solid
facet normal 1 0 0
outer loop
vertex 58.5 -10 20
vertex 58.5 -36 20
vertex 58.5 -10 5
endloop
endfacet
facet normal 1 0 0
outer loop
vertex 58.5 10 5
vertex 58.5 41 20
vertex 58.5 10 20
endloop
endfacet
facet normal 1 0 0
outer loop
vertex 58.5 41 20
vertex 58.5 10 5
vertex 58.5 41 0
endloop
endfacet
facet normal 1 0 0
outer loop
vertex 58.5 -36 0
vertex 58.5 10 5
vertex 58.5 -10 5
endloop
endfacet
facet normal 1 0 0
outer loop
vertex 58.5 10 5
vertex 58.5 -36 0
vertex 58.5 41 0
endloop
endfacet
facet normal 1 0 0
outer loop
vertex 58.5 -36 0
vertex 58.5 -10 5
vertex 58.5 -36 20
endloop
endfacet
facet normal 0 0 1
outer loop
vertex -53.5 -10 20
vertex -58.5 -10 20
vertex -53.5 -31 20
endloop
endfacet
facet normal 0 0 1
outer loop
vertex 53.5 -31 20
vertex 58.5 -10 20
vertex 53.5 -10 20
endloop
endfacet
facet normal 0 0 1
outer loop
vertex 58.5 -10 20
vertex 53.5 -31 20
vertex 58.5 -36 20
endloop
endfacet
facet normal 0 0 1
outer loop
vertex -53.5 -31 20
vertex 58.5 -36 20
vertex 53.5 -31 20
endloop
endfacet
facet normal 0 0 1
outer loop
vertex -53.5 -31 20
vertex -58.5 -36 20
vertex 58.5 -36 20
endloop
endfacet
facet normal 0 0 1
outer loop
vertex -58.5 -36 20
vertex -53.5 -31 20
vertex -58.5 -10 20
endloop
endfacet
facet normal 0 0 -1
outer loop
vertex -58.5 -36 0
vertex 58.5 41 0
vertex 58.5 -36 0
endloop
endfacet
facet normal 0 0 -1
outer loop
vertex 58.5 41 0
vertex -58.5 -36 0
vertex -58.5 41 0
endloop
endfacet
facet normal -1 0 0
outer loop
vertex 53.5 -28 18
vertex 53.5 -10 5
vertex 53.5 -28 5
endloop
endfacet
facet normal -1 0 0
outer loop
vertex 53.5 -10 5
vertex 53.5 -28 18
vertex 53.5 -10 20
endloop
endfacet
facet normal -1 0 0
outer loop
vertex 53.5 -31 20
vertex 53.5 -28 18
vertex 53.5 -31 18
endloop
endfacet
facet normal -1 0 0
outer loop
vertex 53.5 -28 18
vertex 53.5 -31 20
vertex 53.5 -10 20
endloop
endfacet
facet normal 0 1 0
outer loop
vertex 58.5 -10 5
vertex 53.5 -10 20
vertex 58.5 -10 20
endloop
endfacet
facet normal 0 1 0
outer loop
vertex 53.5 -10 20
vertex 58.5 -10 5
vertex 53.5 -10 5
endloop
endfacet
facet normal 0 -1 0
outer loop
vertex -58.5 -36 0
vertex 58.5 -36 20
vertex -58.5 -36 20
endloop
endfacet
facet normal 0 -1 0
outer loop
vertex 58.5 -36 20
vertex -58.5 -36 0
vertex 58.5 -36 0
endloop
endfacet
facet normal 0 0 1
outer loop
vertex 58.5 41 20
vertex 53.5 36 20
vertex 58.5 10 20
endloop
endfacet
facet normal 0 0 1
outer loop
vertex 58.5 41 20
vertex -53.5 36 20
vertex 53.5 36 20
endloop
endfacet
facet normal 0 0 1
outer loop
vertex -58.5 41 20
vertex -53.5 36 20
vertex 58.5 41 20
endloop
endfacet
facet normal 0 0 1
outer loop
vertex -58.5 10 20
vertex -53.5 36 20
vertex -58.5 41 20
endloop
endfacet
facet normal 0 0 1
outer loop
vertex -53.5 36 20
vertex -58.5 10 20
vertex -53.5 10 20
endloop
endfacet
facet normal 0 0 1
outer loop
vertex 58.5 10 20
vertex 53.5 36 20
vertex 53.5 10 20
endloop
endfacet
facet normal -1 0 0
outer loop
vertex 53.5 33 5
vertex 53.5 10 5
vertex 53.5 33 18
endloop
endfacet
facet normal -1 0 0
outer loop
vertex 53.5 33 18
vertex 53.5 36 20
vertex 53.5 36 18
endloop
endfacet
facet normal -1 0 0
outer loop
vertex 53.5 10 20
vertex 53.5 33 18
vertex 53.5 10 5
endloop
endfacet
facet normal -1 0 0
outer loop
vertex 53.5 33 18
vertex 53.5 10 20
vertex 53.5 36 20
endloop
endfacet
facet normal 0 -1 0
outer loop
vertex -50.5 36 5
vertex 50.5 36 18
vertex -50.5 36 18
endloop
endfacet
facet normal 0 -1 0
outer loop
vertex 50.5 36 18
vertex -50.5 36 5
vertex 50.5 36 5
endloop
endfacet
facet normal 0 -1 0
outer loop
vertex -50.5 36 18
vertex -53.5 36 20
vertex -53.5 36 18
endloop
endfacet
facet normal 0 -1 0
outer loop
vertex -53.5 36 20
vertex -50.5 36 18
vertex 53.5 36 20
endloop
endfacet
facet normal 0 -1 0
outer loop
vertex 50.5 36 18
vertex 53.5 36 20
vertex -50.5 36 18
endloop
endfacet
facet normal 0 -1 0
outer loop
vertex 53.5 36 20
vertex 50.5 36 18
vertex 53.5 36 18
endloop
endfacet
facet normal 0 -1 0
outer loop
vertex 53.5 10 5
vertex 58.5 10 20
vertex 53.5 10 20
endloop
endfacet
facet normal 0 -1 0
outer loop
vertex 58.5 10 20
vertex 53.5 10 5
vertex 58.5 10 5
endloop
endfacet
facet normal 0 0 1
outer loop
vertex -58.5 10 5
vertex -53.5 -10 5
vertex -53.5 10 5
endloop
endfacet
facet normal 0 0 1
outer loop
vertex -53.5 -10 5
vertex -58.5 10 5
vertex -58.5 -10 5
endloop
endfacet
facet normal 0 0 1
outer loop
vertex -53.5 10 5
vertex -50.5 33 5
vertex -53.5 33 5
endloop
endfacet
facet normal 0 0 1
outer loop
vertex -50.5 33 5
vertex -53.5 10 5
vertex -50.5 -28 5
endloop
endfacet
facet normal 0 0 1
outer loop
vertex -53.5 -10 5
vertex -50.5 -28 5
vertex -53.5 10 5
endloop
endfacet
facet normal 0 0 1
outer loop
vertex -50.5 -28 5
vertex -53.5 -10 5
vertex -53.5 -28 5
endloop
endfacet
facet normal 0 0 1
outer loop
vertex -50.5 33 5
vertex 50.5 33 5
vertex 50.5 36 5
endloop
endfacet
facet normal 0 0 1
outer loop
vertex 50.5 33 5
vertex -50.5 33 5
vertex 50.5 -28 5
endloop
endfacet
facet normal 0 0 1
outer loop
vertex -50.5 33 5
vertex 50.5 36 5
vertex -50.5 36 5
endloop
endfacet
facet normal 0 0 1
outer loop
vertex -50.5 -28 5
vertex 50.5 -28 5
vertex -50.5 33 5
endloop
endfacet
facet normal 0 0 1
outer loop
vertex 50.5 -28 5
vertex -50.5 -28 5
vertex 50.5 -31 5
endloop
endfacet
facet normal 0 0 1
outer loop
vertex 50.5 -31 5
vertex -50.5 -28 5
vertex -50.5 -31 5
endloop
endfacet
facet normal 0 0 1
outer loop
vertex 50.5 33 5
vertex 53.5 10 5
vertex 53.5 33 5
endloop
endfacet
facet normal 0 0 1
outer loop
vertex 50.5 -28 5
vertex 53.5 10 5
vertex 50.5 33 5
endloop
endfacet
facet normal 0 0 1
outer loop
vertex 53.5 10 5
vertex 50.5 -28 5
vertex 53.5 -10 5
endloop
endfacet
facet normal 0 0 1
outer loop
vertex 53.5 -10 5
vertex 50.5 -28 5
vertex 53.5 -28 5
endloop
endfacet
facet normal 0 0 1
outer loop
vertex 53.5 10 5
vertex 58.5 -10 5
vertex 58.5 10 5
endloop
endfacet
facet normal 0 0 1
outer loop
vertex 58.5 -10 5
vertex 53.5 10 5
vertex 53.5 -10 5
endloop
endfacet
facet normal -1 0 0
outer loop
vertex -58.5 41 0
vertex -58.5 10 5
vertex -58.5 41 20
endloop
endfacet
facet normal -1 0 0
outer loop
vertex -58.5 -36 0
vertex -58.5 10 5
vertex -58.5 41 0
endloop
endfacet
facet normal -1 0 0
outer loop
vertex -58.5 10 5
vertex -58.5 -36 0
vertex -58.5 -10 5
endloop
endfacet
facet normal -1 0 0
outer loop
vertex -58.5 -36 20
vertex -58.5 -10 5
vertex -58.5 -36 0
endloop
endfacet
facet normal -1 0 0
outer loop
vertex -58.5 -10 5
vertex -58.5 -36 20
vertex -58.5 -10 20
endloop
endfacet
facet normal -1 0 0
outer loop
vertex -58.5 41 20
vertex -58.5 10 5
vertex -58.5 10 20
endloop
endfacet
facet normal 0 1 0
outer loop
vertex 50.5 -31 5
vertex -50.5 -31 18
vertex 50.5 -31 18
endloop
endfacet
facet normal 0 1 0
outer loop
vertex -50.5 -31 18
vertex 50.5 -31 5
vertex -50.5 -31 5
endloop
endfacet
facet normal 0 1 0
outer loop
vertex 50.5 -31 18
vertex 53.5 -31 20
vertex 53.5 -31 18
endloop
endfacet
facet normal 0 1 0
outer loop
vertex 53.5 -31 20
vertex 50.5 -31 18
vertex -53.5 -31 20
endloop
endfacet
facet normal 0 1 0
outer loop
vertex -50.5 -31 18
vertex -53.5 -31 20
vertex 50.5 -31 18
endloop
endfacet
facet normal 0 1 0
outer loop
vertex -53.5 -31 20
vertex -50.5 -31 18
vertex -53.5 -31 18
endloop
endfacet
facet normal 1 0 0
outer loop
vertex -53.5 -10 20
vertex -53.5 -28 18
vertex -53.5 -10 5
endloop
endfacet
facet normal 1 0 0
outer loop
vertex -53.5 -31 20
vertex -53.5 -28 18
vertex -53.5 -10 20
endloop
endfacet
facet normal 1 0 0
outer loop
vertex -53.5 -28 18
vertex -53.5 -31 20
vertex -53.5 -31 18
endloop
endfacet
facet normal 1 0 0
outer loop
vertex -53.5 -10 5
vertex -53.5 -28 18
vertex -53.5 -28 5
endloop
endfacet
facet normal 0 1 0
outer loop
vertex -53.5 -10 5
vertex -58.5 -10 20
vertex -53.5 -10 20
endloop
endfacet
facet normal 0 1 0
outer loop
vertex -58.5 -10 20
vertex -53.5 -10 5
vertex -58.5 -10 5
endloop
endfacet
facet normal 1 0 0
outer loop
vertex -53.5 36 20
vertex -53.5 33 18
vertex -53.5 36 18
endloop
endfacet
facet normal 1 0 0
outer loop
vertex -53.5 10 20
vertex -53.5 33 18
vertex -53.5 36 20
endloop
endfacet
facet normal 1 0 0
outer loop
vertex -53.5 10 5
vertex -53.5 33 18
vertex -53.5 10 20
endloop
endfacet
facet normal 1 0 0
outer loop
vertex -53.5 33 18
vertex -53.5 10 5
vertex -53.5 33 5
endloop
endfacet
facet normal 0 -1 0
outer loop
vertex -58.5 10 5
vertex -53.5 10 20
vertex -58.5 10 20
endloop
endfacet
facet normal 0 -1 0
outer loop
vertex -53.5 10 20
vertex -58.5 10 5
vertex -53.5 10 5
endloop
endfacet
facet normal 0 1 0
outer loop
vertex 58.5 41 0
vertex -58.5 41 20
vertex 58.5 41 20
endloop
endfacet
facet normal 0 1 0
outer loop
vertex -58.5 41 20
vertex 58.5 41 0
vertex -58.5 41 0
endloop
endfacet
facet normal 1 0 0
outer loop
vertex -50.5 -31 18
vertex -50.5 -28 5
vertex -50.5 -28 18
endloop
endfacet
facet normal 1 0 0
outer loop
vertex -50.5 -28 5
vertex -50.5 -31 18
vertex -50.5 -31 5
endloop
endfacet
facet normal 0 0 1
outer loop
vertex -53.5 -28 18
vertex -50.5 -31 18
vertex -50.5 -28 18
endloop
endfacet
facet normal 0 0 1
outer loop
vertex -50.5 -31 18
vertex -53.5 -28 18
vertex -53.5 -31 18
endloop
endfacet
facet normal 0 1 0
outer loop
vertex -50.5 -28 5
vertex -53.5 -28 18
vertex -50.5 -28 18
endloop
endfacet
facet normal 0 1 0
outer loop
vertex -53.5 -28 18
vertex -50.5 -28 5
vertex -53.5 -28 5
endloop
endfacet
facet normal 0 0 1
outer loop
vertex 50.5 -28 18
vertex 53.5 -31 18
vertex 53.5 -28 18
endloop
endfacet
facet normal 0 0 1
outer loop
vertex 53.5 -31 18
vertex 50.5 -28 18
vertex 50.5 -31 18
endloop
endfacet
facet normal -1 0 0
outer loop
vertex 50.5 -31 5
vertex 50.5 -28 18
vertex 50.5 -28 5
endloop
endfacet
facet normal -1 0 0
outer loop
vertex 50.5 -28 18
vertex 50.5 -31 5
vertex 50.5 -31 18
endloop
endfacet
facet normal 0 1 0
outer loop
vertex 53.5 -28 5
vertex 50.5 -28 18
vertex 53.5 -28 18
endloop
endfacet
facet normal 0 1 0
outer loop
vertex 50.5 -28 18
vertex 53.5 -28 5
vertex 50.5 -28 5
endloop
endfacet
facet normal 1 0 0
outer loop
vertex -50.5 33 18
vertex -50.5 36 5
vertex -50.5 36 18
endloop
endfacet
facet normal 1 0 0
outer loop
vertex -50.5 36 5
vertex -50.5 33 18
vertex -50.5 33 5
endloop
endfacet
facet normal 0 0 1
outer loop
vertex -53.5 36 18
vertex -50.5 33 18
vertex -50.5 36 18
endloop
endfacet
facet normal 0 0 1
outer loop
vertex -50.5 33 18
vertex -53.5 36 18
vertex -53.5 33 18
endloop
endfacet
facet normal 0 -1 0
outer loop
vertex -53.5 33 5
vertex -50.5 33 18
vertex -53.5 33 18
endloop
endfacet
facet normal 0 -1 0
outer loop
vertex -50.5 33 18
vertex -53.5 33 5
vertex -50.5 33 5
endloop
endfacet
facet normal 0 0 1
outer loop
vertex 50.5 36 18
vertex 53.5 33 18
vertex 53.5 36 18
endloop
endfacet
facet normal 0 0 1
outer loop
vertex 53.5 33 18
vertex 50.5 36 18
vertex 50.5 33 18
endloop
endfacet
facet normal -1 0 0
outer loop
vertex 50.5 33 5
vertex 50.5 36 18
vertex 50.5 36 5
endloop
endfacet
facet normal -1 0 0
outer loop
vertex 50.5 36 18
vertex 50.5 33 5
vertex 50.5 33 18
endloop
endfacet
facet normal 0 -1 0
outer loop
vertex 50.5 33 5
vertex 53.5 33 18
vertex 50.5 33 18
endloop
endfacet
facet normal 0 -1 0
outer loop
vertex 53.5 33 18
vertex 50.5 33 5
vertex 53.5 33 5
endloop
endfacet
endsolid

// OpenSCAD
module carteFolder(L = 112, W = 67, H = 20) {
    l = L+5;
    w = W+5;
    
    // Déplacer tout pour centrer sur l'origine
    translate([-l/2, -w/2, 0]) {
        cube([l,w,5]);
        
        cube([l,5,H]);
        cube([5,w/2-10,H]);
        translate([0,w/2+10,0])
            cube([5,w/2-10,H]);
        
        translate([l-5,0,0]){
            cube([5,w/2-10,H]);
            translate([0,w/2+10,0])
                cube([5,w/2-10,H]);
        }
        
        translate([0,w,0])
            cube([l,5,H]);
        
        // Cubes dans les 4 coins (3mm×3mm×13mm)
        translate([5, 5, 5])
            cube([3, 3, 13]);
        
        translate([l-8, 5, 5])
            cube([3, 3, 13]);
        
        translate([5, w-3, 5])
            cube([3, 3, 13]);
        
        translate([l-8, w-3, 5])
            cube([3, 3, 13]);
    }
}

carteFolder();
